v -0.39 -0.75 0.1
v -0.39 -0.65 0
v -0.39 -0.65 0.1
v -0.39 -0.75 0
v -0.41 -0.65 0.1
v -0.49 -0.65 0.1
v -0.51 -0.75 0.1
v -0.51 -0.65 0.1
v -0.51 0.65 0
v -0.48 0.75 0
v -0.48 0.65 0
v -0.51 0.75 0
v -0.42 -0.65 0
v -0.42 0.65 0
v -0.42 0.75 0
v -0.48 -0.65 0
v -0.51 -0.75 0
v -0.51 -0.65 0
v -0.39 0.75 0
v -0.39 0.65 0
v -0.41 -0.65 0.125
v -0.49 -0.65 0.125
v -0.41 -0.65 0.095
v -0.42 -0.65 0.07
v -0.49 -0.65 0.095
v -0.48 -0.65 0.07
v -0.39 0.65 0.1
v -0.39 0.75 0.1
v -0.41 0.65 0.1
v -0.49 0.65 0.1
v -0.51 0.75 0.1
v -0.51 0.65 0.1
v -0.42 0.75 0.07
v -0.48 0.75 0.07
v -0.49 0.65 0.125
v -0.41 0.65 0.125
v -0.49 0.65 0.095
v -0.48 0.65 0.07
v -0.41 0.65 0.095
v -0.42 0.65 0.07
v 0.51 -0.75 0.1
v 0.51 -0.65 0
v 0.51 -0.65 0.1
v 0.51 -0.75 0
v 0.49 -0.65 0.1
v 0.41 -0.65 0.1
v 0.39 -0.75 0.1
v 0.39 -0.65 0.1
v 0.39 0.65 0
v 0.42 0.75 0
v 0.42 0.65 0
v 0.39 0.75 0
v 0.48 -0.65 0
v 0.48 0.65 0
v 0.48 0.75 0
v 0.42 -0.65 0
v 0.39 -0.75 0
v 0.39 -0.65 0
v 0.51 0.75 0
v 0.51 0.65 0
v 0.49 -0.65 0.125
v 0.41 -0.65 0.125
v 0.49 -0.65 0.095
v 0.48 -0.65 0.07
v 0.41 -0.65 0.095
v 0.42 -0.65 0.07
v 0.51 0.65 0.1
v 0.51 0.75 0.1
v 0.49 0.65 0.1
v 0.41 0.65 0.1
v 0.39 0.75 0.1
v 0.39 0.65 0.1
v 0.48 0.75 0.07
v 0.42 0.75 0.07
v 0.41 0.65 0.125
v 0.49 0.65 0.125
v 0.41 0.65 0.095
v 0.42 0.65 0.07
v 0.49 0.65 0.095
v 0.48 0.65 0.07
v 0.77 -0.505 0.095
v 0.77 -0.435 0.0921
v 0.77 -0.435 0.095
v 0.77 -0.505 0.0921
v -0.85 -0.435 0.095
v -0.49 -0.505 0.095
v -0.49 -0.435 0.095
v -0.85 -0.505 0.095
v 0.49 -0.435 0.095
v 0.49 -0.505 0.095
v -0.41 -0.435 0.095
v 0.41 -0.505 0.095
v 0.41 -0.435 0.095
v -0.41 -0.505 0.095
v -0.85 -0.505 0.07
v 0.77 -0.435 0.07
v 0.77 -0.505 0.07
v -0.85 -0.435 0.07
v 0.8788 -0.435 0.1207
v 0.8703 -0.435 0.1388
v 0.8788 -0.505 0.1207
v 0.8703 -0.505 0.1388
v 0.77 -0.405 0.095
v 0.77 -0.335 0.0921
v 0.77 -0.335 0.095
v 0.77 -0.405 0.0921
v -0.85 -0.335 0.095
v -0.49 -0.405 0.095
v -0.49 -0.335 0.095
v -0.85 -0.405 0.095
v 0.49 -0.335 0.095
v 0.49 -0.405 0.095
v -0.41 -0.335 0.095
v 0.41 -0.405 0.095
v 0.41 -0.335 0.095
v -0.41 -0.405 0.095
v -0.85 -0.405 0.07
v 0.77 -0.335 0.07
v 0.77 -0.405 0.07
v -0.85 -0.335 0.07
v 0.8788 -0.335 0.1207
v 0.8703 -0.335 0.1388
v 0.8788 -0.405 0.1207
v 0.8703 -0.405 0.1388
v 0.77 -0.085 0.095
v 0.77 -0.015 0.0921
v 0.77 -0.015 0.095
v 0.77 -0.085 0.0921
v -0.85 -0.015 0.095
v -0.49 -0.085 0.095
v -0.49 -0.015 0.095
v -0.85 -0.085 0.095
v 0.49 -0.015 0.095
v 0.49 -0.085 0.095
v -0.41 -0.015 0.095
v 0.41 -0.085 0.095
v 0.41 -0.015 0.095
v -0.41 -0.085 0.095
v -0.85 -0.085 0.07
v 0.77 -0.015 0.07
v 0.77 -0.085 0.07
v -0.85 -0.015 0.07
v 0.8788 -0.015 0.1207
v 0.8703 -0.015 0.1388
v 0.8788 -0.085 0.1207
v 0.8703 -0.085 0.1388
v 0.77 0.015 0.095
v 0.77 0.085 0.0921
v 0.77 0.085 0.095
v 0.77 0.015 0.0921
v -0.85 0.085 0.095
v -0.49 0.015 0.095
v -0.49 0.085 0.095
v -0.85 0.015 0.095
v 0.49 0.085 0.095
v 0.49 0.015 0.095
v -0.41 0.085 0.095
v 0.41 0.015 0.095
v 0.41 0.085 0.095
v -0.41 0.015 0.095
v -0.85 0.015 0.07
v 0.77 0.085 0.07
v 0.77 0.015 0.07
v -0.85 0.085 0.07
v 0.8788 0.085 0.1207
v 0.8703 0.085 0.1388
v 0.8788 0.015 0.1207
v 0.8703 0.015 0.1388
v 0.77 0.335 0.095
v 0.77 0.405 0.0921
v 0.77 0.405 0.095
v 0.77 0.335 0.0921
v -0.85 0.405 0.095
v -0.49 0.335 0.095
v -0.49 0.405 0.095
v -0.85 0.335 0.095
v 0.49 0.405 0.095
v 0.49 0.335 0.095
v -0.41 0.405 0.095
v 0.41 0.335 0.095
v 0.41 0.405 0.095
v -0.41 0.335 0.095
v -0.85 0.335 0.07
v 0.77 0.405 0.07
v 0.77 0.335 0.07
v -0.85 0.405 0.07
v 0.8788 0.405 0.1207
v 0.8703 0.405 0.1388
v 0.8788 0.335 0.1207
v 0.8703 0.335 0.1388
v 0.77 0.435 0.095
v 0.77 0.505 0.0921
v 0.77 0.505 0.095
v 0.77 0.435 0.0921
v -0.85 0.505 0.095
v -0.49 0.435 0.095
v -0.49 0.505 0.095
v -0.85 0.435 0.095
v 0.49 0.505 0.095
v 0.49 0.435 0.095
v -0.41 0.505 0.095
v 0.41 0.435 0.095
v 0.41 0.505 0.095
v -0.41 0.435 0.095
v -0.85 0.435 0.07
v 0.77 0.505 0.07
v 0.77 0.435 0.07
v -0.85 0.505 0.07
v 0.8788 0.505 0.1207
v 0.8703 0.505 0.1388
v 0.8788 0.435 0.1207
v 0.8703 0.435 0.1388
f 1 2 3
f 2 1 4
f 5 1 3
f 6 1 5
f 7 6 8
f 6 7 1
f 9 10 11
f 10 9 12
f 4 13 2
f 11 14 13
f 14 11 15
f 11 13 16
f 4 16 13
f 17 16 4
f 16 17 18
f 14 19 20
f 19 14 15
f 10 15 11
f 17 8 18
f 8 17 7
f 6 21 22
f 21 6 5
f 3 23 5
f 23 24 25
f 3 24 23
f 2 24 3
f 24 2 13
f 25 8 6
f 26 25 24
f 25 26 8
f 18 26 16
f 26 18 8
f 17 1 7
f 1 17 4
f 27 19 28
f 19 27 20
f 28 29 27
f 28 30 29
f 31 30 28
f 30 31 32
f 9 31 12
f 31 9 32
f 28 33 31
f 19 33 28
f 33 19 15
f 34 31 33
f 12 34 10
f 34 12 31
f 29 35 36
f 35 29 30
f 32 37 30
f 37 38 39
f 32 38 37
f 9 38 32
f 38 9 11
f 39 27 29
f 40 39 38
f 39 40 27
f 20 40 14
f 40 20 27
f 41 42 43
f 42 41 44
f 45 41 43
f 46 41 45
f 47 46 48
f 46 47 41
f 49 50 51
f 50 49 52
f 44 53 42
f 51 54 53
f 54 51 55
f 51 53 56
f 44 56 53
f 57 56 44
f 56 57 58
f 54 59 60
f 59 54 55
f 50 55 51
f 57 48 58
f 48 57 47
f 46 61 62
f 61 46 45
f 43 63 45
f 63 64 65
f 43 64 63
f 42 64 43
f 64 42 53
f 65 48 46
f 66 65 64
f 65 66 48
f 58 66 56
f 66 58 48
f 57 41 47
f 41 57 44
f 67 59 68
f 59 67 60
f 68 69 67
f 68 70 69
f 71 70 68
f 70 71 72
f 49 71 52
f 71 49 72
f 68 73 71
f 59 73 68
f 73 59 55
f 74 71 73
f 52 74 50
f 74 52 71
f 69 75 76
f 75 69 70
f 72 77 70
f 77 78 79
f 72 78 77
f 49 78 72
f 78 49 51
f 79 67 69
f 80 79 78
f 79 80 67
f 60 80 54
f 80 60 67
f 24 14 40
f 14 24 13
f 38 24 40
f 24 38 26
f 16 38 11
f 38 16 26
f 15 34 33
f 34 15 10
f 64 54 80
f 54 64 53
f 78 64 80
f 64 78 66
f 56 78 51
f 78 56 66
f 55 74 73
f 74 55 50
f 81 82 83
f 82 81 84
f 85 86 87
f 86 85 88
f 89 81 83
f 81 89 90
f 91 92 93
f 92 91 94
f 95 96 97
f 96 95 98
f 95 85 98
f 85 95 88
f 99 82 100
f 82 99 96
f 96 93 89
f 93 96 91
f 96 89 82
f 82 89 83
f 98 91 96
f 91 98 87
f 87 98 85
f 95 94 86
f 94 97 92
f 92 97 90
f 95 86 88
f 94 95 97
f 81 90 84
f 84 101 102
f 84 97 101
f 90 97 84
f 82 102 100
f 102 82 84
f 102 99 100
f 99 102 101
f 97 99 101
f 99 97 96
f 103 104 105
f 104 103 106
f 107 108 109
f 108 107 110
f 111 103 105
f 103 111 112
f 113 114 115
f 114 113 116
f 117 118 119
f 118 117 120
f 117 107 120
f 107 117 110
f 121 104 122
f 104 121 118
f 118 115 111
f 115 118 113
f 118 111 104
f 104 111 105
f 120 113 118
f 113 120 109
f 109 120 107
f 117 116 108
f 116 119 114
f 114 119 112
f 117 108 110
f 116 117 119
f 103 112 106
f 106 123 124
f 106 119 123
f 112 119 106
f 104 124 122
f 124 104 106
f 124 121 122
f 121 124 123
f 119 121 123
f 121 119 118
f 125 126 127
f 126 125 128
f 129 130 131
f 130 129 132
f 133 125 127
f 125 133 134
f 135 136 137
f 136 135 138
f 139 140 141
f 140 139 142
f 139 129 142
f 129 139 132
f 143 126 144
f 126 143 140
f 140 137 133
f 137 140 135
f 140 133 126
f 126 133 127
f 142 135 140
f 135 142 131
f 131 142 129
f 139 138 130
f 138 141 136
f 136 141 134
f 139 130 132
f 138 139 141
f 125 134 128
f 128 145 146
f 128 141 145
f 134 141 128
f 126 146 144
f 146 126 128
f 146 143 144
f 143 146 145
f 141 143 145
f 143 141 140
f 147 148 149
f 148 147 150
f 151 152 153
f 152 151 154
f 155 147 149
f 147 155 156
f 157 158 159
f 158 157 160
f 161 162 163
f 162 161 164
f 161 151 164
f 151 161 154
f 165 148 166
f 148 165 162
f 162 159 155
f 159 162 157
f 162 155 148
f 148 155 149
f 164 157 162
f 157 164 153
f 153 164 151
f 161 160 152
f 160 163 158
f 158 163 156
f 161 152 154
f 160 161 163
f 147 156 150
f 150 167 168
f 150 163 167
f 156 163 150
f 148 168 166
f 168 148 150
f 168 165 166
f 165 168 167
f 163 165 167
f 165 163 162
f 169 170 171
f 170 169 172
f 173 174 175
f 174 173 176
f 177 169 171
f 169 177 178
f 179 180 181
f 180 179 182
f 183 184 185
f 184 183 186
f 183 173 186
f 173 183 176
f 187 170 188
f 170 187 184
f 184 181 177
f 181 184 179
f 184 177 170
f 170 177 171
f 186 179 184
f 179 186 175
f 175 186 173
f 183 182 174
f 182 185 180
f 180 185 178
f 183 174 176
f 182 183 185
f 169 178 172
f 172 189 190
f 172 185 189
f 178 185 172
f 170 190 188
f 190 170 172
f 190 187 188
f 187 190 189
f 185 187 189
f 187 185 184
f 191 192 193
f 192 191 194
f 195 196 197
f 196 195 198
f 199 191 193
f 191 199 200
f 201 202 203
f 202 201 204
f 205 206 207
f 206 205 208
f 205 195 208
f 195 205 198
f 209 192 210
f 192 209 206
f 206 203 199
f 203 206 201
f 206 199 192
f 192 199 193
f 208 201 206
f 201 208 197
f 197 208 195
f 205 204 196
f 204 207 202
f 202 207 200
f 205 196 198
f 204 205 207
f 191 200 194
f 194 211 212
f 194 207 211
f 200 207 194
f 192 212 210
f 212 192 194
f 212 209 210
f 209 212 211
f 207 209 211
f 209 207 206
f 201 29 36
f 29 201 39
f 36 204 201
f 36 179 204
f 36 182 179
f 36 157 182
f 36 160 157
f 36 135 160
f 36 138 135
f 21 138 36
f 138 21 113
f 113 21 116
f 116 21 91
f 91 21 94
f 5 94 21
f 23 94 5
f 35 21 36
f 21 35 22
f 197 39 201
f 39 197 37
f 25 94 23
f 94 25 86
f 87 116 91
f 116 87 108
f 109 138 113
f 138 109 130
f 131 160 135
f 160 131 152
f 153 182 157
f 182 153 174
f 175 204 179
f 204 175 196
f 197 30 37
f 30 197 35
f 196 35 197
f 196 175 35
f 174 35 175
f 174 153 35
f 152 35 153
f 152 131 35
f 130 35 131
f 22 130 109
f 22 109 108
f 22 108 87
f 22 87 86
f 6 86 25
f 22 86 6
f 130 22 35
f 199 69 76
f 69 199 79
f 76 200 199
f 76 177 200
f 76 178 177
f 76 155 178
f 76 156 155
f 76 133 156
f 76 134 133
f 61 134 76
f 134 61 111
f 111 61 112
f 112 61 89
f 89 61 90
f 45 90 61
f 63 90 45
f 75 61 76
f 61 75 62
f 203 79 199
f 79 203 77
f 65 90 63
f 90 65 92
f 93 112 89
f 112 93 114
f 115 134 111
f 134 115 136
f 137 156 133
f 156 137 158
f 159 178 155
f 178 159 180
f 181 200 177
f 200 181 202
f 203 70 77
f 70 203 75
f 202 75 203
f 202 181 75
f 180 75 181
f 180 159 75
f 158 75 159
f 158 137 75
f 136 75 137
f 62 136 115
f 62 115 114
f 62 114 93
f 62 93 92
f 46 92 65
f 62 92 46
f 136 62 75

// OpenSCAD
// Roof rack with skis — two crossbars and three pairs of skis clamped
// tips forward, set on a car's roof (render.carRoofs gives each kind's
// roof height). Origin at the rack's centre on the roof. Drawn with a
// white tint, so the skis keep their colours.
// Conventions, units, and axis docs: see models-src/README.md.
$fn = 8;

bar_w = 1.50;
color([0.12, 0.12, 0.12]) for (x = [-0.45, 0.45]) {
    translate([x - 0.03, -bar_w / 2, 0]) cube([0.06, bar_w, 0.07]);
    for (s = [-1, 1]) translate([x - 0.06, s * (bar_w / 2 - 0.05) - 0.05, 0]) cube([0.12, 0.10, 0.10]);
}
skis = [[0.85, 0.15, 0.12], [0.15, 0.40, 0.85], [0.95, 0.85, 0.20]];
for (i = [0:2]) color(skis[i]) for (d = [-0.05, 0.05])
    translate([-0.85, (i - 1) * 0.42 + d - 0.035, 0.07]) {
        cube([1.62, 0.07, 0.025]);
        translate([1.62, 0, 0]) rotate([0, -25, 0]) cube([0.12, 0.07, 0.02]); // tip
    }
// Clamps over the skis.
color([0.12, 0.12, 0.12]) for (x = [-0.45, 0.45])
    translate([x - 0.04, -bar_w / 2 + 0.1, 0.095]) cube([0.08, bar_w - 0.2, 0.03]);
